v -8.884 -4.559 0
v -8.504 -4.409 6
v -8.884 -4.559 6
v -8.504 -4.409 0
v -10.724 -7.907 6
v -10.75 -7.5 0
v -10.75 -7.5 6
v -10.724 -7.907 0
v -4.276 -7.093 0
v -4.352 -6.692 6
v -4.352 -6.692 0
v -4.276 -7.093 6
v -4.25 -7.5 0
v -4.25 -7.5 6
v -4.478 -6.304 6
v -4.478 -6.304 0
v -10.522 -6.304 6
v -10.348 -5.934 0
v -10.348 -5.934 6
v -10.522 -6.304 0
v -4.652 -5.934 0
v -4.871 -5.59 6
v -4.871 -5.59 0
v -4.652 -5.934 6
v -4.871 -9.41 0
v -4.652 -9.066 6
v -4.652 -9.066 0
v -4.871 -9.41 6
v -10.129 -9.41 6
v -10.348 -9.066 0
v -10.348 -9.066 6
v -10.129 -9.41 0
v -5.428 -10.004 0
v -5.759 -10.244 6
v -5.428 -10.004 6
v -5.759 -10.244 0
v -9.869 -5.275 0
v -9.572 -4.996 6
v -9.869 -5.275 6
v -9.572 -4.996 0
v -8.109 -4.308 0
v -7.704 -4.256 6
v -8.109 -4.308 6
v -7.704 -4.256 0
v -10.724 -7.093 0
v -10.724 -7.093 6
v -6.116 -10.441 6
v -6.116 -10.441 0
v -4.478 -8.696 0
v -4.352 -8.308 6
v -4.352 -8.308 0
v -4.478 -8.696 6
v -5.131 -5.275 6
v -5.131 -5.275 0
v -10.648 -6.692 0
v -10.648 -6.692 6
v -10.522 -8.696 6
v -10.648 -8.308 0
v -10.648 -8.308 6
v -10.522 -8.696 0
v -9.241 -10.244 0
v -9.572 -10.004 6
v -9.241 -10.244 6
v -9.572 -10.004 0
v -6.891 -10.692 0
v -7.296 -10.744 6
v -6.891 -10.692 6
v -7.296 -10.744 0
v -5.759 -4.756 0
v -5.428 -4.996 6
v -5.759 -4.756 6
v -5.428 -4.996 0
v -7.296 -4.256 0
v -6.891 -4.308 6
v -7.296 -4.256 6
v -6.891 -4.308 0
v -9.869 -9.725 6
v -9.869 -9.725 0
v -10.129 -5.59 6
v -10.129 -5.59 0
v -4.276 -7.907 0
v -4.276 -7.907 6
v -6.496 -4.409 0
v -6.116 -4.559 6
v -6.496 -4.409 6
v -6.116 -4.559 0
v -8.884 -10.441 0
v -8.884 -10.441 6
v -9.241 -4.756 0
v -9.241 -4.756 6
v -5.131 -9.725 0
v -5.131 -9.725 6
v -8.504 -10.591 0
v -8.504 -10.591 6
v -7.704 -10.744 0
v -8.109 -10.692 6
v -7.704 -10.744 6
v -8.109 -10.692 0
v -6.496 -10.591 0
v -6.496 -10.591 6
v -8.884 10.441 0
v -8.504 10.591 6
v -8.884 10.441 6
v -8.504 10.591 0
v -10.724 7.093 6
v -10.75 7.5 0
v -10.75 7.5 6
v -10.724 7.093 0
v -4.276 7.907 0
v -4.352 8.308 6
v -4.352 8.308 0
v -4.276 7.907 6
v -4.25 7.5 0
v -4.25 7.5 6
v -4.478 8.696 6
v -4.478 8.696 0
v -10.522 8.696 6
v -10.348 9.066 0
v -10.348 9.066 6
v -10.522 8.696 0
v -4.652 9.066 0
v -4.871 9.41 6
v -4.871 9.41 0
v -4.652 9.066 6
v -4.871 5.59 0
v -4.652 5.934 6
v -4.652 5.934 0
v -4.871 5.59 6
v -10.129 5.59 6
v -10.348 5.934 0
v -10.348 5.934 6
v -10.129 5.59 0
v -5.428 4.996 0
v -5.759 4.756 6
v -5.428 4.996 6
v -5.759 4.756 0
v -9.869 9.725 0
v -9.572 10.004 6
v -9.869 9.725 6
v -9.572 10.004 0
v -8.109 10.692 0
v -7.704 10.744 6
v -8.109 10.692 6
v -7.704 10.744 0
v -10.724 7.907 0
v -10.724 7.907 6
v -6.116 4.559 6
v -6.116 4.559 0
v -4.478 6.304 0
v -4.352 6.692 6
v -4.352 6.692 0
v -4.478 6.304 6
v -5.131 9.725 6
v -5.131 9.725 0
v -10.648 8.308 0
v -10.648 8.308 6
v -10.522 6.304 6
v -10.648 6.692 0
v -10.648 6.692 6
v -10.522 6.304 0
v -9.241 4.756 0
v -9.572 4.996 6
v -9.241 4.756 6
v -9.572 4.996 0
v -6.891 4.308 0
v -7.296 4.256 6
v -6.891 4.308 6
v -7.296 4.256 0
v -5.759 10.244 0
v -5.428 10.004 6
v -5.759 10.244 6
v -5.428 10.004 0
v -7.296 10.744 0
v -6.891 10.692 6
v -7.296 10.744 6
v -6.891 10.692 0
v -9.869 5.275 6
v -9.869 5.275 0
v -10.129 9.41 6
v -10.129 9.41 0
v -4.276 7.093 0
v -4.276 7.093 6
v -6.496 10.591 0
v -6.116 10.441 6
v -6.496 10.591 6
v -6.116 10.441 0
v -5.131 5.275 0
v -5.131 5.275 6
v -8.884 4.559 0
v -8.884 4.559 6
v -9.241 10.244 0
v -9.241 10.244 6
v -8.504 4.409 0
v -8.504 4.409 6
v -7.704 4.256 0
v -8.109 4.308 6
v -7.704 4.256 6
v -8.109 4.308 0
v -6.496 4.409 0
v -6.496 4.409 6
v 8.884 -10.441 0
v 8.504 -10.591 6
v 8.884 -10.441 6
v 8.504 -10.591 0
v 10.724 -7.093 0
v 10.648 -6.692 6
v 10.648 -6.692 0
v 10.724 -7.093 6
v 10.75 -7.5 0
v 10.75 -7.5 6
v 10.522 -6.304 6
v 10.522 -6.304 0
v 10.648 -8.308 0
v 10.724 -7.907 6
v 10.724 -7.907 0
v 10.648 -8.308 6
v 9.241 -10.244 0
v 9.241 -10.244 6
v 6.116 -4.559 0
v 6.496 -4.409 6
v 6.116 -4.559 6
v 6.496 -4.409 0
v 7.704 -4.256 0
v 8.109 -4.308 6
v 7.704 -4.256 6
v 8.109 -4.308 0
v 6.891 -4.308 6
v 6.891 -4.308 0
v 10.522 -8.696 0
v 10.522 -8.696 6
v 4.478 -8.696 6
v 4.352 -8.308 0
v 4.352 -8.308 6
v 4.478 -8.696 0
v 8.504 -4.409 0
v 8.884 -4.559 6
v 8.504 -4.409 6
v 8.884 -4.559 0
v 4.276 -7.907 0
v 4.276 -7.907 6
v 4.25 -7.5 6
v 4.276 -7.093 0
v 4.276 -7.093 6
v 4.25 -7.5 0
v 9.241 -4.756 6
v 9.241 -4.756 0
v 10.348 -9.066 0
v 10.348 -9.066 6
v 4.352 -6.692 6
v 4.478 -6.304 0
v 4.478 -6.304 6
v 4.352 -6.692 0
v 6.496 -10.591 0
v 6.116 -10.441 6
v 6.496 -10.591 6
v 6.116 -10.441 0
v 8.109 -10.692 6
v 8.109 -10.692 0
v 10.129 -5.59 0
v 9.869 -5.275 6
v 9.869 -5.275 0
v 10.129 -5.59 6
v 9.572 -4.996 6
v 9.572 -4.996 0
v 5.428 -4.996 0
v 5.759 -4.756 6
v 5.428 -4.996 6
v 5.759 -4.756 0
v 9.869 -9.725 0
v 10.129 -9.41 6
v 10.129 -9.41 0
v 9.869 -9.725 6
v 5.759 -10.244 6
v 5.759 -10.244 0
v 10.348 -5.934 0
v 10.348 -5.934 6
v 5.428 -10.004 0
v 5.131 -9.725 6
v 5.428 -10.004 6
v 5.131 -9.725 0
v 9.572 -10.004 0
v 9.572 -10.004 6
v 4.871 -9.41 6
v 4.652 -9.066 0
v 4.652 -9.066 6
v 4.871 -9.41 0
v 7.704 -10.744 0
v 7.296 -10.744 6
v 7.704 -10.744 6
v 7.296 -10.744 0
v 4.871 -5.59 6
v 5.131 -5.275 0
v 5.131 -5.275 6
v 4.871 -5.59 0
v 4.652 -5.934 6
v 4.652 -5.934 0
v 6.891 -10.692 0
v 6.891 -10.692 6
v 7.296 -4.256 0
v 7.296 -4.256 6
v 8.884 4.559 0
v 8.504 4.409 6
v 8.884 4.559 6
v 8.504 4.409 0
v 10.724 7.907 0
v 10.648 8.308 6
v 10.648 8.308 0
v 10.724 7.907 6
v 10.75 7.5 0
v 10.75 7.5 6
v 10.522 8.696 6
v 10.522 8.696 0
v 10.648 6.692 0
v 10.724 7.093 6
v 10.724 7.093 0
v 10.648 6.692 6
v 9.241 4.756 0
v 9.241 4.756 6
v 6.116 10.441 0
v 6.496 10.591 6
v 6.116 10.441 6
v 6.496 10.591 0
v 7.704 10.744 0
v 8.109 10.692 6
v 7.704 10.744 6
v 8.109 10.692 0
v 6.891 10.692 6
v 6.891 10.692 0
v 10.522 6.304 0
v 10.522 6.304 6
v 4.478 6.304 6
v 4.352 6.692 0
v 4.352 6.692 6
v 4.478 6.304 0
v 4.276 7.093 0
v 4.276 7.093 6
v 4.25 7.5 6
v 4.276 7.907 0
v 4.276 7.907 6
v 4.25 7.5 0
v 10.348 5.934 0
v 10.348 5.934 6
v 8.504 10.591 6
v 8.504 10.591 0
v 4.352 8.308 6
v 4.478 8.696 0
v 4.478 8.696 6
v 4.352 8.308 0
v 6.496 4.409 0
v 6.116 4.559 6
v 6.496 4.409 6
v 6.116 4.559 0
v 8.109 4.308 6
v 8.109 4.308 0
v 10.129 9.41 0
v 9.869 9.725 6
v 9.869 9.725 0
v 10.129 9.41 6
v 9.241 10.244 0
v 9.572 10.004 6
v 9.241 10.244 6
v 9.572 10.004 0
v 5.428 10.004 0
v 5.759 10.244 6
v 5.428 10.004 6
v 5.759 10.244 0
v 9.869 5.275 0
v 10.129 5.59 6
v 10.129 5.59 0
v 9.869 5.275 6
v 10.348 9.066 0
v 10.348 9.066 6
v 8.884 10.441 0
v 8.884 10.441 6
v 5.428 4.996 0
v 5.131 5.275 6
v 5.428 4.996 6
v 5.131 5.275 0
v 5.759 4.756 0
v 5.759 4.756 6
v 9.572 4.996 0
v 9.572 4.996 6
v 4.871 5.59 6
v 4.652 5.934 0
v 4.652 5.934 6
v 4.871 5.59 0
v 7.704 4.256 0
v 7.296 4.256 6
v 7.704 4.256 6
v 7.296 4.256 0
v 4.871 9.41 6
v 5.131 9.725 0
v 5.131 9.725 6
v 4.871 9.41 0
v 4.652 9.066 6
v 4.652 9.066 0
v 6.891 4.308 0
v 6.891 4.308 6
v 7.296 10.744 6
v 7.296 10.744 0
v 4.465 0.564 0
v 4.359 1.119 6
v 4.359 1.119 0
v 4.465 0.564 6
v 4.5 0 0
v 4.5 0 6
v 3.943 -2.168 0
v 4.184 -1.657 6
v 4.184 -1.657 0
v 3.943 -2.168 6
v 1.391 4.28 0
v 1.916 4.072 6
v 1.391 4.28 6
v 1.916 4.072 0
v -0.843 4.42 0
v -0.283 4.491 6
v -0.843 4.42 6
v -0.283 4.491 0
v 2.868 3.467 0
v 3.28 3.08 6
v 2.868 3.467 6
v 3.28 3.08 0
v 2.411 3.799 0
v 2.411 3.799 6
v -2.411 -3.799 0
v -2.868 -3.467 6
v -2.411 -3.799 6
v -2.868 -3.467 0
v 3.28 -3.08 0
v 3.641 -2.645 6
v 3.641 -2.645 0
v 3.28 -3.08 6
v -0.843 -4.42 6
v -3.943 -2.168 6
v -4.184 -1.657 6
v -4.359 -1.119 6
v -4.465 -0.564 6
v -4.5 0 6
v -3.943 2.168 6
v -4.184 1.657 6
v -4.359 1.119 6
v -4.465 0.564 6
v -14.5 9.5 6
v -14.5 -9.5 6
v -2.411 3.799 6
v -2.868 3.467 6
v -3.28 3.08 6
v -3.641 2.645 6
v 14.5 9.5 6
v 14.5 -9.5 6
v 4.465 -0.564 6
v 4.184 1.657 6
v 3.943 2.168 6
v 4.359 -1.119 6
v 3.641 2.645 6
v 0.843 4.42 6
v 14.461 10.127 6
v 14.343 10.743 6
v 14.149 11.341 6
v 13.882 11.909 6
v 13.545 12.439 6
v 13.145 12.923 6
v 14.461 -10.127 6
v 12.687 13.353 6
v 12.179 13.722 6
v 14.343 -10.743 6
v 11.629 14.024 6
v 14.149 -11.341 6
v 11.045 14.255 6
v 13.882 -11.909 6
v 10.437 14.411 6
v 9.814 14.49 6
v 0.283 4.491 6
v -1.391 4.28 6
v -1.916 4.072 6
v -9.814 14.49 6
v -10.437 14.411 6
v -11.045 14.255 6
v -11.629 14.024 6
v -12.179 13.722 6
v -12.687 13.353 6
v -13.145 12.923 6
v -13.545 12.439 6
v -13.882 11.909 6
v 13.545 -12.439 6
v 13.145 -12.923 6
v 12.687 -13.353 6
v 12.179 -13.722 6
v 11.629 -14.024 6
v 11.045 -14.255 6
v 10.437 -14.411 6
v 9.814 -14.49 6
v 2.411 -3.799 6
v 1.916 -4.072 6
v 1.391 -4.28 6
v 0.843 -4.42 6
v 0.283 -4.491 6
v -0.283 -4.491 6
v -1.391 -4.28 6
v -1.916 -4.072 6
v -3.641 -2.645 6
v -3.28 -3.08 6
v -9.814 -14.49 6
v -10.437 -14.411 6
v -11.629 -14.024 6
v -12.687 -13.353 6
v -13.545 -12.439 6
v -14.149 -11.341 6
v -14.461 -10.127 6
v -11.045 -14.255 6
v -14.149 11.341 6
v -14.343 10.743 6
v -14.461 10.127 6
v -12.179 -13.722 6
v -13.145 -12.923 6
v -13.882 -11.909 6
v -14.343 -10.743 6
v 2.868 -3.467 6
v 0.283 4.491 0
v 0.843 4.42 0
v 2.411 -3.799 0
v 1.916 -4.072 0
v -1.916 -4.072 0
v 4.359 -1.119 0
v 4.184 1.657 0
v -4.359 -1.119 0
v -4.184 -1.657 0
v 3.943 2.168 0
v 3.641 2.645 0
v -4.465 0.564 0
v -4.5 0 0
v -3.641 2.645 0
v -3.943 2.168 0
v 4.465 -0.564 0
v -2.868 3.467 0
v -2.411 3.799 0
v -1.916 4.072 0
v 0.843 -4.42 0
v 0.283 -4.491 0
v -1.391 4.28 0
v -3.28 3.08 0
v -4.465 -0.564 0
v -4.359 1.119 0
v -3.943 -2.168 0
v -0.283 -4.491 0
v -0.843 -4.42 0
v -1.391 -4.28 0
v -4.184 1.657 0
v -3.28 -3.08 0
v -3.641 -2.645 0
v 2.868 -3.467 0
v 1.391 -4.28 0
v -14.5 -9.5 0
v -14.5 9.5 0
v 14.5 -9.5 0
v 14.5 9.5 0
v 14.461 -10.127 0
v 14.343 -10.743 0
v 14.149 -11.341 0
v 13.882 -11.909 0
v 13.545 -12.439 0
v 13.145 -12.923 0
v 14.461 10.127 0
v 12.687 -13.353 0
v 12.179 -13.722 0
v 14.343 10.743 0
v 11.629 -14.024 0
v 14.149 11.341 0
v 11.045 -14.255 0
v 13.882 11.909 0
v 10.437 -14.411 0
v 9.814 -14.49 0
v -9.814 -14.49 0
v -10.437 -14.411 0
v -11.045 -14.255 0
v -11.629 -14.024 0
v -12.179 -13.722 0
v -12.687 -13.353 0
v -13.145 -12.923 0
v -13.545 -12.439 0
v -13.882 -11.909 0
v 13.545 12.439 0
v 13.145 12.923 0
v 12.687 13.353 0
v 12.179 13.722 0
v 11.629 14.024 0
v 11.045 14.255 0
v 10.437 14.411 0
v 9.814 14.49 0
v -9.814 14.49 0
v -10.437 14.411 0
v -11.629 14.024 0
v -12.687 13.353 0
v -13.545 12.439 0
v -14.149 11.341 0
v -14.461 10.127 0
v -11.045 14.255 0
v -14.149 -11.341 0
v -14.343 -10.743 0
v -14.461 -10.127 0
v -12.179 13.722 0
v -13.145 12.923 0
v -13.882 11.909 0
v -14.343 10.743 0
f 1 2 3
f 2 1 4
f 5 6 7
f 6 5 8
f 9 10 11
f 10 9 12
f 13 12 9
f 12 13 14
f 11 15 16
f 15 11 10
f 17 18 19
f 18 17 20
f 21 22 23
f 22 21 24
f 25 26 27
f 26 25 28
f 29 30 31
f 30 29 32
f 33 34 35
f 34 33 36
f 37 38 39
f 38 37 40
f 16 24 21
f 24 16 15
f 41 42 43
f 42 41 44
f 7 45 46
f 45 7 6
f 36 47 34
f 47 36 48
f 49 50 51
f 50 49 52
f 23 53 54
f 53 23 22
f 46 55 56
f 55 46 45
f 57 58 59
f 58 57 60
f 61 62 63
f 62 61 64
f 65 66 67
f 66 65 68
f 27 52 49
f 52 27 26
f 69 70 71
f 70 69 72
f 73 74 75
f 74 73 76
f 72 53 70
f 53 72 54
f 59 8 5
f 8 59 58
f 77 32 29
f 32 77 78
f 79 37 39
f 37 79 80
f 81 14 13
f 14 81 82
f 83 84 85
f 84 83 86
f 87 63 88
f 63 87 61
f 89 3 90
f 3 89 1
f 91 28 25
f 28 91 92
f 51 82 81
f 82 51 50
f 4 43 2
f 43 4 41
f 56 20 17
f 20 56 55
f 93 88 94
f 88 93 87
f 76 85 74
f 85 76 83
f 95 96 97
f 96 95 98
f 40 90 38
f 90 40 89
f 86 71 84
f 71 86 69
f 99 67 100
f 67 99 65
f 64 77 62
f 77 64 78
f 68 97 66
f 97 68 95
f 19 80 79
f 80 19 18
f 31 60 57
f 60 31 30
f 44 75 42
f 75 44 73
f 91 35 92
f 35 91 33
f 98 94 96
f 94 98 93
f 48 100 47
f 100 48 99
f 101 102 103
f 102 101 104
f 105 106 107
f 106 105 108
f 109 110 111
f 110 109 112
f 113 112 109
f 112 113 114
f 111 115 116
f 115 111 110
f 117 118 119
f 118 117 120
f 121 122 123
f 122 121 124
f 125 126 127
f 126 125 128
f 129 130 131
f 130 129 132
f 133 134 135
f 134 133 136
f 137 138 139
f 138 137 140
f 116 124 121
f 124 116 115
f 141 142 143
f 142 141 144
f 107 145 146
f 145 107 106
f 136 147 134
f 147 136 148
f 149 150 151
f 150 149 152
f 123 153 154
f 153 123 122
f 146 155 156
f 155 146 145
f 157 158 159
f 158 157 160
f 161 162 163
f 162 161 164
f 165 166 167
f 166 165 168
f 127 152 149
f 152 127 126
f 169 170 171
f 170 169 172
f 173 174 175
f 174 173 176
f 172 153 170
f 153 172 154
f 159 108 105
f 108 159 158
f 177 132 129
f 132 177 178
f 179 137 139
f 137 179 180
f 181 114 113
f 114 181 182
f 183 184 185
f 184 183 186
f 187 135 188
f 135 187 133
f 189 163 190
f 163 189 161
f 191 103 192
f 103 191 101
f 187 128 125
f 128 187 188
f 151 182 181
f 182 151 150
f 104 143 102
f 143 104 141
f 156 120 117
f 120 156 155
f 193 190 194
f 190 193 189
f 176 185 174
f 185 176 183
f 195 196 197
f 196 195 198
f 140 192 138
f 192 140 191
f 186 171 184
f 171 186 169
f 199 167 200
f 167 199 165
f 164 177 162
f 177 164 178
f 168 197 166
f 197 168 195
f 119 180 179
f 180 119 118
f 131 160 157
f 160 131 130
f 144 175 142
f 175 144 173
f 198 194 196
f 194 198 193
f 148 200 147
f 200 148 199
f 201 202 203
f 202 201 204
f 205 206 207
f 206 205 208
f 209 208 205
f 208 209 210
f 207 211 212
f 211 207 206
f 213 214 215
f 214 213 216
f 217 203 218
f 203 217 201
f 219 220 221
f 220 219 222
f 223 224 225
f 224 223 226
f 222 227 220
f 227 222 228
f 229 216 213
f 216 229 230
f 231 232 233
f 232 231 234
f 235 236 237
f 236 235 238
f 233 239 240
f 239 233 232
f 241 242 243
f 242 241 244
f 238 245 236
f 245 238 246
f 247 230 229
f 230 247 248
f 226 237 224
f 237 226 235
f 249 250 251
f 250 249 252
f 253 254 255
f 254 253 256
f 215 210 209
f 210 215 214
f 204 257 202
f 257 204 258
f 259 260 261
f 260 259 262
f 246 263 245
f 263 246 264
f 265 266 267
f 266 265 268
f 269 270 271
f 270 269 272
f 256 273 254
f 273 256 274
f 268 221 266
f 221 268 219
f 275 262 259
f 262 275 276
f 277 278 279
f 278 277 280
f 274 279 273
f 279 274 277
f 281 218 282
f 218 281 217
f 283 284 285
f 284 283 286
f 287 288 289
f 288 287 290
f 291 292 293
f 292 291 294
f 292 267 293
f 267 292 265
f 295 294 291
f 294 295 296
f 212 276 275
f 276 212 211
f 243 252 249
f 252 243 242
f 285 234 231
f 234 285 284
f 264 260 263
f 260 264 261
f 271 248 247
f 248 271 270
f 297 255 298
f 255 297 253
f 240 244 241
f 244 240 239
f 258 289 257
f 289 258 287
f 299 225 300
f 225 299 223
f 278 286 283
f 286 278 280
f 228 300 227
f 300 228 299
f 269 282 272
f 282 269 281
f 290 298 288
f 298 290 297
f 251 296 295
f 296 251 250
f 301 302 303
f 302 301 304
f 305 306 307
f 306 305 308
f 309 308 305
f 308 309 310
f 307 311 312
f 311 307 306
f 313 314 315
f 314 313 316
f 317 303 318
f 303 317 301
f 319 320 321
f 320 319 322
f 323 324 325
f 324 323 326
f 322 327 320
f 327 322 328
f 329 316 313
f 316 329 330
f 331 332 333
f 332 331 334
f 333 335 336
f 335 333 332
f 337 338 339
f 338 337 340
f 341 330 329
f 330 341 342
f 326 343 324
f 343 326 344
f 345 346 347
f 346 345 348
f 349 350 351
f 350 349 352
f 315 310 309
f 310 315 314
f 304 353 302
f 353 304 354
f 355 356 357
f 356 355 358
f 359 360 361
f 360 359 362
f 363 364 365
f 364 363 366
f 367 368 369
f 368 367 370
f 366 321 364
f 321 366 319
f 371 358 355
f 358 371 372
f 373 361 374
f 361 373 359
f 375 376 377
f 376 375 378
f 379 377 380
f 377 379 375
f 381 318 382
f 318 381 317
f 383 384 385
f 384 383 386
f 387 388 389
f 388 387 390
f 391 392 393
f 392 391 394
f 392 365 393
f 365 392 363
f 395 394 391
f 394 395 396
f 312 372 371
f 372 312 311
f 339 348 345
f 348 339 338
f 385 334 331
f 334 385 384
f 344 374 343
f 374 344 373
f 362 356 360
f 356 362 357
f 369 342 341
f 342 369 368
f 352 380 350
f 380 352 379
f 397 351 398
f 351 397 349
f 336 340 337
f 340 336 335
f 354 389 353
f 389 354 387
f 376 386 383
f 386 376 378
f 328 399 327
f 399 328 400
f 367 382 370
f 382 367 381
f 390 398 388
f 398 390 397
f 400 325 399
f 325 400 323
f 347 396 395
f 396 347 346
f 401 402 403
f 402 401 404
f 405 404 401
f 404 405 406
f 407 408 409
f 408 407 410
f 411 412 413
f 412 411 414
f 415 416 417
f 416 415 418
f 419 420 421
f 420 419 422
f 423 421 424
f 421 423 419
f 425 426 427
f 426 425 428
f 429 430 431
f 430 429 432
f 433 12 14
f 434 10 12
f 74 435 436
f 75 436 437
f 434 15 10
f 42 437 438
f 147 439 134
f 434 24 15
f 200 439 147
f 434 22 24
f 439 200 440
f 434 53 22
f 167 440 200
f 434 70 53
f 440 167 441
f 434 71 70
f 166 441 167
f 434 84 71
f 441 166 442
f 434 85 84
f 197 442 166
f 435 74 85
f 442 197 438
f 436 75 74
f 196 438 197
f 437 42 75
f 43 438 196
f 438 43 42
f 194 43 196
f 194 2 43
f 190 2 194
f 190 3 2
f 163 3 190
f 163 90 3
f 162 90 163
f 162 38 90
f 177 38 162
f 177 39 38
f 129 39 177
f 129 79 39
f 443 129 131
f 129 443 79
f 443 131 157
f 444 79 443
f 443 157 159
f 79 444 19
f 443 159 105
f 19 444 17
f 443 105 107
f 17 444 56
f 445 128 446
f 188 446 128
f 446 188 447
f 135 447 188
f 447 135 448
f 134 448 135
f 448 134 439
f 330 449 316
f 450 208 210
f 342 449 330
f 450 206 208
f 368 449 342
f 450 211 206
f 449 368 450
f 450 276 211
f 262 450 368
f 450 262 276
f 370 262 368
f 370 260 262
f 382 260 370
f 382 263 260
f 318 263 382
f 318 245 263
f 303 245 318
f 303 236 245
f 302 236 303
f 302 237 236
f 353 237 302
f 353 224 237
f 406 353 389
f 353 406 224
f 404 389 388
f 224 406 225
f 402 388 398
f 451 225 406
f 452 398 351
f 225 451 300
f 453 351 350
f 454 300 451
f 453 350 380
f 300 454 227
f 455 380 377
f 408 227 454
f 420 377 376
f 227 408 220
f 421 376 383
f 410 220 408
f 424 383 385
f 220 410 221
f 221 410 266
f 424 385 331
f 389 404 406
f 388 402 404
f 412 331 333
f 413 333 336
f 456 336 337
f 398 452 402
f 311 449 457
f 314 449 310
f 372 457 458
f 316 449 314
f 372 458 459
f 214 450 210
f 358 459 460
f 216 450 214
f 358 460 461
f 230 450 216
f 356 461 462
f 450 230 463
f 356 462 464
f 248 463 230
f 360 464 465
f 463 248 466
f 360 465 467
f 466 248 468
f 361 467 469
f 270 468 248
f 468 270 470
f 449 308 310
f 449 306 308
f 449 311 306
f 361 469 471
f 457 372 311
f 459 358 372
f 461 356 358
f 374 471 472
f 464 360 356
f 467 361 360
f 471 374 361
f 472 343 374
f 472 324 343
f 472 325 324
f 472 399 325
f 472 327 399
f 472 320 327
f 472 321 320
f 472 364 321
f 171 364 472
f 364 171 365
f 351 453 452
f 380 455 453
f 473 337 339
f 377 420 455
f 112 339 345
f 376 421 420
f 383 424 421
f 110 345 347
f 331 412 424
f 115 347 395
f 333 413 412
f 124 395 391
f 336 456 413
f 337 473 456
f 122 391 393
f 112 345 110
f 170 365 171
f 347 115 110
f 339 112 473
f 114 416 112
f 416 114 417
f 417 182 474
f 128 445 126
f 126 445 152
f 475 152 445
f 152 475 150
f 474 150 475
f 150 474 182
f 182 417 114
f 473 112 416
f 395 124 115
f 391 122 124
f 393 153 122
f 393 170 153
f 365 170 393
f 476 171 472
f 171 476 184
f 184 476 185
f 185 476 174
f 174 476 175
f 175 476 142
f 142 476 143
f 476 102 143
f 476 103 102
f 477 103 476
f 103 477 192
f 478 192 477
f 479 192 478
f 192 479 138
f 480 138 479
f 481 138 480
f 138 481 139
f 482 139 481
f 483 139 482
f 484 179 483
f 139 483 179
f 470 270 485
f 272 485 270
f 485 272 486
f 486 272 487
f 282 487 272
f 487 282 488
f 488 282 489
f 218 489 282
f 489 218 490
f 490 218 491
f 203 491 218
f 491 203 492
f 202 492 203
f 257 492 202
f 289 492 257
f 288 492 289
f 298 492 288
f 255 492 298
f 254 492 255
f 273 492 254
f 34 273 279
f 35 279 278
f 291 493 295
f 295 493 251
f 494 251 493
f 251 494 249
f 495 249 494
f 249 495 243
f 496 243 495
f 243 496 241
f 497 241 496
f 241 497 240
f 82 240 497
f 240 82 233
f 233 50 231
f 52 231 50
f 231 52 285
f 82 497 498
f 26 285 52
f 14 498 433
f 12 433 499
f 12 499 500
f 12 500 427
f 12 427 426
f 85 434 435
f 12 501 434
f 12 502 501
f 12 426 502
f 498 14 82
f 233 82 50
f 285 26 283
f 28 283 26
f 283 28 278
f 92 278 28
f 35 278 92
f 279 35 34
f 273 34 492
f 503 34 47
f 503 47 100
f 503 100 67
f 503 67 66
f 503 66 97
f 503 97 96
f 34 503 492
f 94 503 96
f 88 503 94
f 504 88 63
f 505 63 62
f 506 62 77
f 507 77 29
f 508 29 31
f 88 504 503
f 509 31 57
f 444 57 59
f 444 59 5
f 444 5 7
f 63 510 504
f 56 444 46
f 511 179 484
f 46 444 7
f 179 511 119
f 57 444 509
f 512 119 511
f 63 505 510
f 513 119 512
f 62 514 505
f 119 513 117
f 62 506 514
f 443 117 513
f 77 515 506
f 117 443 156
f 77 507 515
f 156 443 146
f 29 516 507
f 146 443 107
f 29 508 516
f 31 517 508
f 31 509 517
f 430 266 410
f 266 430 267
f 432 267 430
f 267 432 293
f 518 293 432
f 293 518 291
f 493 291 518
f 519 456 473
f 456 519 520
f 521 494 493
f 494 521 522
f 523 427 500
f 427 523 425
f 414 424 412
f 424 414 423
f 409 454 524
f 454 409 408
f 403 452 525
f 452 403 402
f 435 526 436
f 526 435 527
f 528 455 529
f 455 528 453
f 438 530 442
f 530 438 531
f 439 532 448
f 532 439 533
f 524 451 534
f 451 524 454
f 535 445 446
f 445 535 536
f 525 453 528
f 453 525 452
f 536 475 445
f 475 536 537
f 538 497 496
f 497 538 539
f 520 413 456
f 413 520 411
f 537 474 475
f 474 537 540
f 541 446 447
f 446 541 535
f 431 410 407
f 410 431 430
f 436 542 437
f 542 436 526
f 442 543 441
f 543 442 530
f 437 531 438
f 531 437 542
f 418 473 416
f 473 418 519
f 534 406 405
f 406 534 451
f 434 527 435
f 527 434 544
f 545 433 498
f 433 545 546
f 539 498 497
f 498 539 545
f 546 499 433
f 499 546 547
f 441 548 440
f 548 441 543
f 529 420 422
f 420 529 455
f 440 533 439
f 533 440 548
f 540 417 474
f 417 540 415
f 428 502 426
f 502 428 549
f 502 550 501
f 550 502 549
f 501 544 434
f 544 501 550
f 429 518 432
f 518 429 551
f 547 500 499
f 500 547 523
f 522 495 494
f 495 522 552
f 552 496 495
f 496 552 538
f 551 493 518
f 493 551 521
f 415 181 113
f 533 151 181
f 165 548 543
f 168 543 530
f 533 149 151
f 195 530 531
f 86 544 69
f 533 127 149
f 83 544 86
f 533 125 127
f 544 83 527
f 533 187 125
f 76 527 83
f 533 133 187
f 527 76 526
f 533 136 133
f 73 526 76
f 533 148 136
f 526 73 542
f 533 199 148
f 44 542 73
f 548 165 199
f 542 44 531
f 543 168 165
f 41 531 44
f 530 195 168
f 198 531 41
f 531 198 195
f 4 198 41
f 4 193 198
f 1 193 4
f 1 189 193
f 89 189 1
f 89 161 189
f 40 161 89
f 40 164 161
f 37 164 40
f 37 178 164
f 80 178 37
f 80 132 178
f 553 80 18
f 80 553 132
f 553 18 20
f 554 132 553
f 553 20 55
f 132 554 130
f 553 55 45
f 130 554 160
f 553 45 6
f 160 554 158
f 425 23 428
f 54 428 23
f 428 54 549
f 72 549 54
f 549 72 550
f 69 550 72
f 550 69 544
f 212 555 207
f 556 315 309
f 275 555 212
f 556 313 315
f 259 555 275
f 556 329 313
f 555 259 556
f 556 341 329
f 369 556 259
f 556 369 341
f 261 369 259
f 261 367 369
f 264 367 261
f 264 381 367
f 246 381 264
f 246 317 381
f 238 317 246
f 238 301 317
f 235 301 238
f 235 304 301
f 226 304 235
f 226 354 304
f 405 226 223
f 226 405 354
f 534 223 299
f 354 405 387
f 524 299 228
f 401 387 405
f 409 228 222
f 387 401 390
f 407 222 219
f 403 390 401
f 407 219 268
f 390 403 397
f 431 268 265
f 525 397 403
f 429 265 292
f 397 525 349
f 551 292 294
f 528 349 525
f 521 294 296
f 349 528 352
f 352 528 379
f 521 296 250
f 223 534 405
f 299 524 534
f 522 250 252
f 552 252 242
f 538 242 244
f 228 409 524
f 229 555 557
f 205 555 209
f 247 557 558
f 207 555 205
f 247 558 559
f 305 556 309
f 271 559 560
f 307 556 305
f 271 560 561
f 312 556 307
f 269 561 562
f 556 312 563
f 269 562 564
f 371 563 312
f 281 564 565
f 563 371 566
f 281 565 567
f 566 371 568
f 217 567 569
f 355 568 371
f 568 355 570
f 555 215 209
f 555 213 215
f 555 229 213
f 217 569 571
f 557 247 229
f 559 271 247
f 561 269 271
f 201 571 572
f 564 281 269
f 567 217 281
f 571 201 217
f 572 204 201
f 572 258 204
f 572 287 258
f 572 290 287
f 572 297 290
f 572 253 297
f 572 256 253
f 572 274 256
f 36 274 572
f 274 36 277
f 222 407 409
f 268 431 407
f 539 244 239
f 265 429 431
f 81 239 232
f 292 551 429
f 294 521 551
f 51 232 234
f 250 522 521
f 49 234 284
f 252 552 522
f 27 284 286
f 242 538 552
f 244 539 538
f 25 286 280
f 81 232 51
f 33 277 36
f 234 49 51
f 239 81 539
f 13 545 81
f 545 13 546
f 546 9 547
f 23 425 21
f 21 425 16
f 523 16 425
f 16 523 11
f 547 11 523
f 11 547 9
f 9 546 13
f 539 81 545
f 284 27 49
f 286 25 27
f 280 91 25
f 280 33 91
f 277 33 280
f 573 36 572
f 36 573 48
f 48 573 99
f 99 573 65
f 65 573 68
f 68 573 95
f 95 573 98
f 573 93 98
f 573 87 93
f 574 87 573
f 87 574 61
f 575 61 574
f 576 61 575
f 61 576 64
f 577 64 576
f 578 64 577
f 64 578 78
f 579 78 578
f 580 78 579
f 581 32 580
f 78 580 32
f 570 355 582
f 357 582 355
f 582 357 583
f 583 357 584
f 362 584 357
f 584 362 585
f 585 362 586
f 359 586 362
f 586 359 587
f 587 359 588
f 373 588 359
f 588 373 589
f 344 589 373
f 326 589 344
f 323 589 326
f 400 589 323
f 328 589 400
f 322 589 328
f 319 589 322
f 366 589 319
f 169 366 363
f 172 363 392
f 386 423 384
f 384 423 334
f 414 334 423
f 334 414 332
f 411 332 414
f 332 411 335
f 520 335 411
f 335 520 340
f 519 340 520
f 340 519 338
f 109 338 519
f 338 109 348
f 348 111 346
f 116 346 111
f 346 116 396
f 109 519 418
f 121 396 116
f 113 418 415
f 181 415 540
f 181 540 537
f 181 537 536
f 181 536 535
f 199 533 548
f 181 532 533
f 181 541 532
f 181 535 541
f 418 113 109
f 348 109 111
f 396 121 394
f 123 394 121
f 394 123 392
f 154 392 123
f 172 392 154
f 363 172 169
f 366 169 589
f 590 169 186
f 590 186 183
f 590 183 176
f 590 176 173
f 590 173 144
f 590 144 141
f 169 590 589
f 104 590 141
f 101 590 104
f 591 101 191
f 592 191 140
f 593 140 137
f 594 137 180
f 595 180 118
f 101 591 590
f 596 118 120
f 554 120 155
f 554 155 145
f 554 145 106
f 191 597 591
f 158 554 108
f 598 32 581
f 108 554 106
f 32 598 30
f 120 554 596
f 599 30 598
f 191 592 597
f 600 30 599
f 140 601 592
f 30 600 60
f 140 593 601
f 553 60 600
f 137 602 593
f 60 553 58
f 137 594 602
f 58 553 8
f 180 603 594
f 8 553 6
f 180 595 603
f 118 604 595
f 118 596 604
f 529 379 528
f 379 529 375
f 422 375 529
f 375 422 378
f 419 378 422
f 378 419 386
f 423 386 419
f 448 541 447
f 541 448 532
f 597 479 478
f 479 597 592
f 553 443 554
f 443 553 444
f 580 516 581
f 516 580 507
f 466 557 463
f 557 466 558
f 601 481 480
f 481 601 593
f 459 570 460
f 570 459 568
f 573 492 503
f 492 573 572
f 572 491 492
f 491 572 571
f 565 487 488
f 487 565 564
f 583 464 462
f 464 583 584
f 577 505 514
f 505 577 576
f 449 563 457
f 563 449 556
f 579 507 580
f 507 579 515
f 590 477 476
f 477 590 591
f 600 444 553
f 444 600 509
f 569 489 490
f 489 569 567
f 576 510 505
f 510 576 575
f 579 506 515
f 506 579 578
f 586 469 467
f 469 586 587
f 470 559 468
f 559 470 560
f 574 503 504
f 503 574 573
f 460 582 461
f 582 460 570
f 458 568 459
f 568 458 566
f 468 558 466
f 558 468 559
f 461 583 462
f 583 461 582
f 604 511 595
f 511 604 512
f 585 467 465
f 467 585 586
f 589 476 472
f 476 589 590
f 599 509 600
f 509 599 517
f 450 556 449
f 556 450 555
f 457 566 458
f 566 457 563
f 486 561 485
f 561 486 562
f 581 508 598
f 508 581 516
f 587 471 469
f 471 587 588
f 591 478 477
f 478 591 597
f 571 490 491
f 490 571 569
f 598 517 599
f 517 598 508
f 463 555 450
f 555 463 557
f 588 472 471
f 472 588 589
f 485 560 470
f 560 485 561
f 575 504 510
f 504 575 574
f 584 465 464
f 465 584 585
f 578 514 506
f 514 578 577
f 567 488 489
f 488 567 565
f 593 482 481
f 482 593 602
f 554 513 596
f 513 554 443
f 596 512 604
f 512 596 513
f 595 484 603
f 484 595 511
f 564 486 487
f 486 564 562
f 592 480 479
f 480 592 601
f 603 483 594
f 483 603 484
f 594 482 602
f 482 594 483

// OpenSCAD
$fn = 50;

difference() {
	union() {
		hull() {
			translate(v = [-9.5, 9.5, 0]) {
				cylinder(h = 6, r = 5);
			}
			translate(v = [9.5, 9.5, 0]) {
				cylinder(h = 6, r = 5);
			}
			translate(v = [-9.5, -9.5, 0]) {
				cylinder(h = 6, r = 5);
			}
			translate(v = [9.5, -9.5, 0]) {
				cylinder(h = 6, r = 5);
			}
		}
	}
	union() {
		translate(v = [-7.5, -7.5, -100.0]) {
			cylinder(h = 200, r = 3.25);
		}
		translate(v = [-7.5, 7.5, -100.0]) {
			cylinder(h = 200, r = 3.25);
		}
		translate(v = [7.5, -7.5, -100.0]) {
			cylinder(h = 200, r = 3.25);
		}
		translate(v = [7.5, 7.5, -100.0]) {
			cylinder(h = 200, r = 3.25);
		}
		translate(v = [-7.5, -7.5, -100.0]) {
			cylinder(h = 200, r = 1.8);
		}
		translate(v = [-7.5, 7.5, -100.0]) {
			cylinder(h = 200, r = 1.8);
		}
		translate(v = [7.5, -7.5, -100.0]) {
			cylinder(h = 200, r = 1.8);
		}
		translate(v = [7.5, 7.5, -100.0]) {
			cylinder(h = 200, r = 1.8);
		}
		cylinder(h = 6, r = 4.5);
	}
}
